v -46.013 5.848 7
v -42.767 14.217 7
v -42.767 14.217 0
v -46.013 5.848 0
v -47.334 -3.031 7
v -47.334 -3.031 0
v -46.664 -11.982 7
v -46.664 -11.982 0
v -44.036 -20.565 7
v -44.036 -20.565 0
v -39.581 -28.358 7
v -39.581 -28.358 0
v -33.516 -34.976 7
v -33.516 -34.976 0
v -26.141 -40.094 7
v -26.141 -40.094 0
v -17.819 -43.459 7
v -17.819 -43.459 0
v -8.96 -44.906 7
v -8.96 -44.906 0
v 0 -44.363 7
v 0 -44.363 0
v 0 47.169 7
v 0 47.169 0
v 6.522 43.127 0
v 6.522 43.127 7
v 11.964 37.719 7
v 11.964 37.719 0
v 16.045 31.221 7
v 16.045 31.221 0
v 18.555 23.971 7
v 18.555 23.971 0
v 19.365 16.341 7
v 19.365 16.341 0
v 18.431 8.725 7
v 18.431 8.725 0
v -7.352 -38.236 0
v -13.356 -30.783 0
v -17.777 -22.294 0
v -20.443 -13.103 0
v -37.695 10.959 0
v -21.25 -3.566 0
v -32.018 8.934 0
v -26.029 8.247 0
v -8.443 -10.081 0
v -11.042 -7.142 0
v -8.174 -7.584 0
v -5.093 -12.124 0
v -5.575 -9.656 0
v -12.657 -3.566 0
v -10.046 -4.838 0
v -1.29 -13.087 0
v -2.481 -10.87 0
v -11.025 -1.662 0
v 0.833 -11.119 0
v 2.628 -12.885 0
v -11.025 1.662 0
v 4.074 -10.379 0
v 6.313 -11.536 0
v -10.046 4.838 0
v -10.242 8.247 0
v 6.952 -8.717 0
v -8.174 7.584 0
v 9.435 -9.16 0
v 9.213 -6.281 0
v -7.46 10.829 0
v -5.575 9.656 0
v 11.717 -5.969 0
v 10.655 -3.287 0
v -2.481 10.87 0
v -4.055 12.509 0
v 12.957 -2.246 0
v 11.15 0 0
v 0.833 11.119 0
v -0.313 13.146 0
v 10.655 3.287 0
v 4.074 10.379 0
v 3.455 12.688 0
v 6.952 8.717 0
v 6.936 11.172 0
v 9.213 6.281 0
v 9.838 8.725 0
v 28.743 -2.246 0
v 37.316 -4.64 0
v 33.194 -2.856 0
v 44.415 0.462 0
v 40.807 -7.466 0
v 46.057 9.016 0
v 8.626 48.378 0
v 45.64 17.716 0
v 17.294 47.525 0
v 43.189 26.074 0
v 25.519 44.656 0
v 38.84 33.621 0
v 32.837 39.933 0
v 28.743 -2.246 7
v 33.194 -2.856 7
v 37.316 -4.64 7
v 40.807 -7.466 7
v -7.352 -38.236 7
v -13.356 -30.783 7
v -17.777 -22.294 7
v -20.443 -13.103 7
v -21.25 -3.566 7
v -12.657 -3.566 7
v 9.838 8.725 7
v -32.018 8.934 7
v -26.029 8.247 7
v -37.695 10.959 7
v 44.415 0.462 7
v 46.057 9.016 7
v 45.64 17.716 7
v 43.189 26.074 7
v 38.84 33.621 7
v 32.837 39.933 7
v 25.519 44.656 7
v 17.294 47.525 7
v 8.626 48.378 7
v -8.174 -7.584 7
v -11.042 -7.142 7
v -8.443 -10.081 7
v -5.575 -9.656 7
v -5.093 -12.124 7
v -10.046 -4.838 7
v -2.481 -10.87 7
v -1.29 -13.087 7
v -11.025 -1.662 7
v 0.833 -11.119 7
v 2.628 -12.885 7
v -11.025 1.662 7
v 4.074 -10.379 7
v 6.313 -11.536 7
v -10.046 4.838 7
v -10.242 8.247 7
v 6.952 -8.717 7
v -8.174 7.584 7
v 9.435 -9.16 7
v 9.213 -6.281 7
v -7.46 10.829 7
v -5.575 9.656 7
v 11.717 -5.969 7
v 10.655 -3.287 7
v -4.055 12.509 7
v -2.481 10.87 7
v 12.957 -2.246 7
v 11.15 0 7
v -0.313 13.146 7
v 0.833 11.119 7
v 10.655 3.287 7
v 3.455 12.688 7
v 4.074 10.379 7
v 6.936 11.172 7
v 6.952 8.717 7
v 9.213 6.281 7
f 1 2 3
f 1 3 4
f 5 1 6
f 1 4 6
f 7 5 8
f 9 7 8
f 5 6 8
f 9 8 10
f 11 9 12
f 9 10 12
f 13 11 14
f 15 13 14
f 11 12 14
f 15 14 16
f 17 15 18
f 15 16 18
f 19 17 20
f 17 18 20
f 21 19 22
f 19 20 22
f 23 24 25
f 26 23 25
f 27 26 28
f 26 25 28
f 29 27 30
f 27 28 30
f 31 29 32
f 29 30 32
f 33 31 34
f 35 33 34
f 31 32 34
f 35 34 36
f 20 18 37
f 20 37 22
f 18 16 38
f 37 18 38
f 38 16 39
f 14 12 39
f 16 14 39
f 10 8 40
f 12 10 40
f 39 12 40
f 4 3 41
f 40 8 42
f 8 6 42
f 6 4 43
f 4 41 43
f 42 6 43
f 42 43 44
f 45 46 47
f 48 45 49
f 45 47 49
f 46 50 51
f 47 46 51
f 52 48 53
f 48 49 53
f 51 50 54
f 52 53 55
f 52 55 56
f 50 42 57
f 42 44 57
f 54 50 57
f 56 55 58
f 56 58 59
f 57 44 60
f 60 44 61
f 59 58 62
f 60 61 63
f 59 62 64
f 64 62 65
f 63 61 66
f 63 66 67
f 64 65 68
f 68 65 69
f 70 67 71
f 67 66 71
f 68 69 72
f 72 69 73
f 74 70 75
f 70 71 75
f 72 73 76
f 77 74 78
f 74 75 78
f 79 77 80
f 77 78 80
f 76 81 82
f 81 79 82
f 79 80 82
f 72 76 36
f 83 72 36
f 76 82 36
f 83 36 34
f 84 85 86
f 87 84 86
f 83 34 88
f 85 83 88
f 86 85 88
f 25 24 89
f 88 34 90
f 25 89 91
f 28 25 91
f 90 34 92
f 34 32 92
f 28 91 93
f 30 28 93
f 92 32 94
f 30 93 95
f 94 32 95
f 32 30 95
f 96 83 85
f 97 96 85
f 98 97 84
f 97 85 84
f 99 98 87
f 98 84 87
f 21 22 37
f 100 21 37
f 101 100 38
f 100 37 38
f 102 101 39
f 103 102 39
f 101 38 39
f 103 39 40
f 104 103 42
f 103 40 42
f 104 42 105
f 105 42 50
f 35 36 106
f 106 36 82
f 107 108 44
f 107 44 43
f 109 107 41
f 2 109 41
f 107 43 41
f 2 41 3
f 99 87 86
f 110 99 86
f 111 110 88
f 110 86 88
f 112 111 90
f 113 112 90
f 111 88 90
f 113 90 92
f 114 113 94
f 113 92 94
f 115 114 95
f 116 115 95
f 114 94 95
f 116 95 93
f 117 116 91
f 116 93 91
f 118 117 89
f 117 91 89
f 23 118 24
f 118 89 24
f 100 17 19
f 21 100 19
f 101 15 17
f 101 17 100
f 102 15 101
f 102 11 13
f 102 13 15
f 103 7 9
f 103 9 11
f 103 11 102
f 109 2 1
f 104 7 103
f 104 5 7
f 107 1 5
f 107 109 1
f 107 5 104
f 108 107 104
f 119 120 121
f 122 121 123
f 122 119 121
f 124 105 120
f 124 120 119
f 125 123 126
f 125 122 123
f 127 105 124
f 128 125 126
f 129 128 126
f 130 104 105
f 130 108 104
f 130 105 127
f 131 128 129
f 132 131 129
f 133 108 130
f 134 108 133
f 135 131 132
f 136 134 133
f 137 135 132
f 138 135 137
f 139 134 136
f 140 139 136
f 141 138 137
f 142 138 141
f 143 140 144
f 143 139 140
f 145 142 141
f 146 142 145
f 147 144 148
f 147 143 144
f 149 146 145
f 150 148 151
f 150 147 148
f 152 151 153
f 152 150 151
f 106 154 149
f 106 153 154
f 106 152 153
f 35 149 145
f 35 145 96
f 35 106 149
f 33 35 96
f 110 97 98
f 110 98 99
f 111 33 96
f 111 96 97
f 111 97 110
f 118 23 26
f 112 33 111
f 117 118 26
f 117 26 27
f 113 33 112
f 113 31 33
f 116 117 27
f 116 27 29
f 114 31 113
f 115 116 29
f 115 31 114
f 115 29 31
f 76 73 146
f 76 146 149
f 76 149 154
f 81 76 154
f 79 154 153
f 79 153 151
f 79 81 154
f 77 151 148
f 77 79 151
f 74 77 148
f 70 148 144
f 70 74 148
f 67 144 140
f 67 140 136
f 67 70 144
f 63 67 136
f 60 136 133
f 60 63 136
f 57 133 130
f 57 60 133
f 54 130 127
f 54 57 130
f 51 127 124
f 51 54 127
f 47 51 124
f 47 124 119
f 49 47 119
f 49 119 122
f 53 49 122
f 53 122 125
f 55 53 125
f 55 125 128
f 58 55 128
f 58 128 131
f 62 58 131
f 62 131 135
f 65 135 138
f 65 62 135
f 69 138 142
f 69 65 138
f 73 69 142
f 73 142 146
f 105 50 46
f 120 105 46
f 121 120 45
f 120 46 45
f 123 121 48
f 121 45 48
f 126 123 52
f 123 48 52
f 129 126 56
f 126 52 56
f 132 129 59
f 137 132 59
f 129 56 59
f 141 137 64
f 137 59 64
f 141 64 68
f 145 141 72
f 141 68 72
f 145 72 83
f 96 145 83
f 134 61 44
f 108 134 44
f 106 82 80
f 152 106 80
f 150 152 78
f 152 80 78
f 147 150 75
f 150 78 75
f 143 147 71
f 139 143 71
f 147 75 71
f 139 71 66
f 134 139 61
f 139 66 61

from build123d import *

# Parameters (mm, degrees)
F0_R     = 11.15
F1_DEPTH = 7


# Not quite as in the source:
# - a feature names something its author has since deleted; it is built from what else it names


with BuildPart() as f1:
    # F0 (on Top) → F1 (new body)
    with BuildSketch(Plane.XY):
        with BuildLine():
            ThreePointArc((-12.6572045799, -3.5661845468), (-12.883564121, 2.6336809867), (-10.2422641065, 8.2473344769))
            Line((-10.2422641065, 8.2473344769), (-26.0292641065, 8.2473344769))
            ThreePointArc((-26.0292641065, 8.2473344769), (-34.9143148349, 9.7844703454), (-42.7665638646, 14.217200689))
            ThreePointArc((-42.7665638646, 14.217200689), (-39.5806592619, -28.3580220296), (0, -44.3633645773))
            ThreePointArc((0, -44.3633645773), (-15.7763325785, -26.6479576979), (-21.2499108166, -3.5661845468))
            Line((-21.2499108166, -3.5661845468), (-12.6572045799, -3.5661845468))
        make_face()
        with BuildLine():
            ThreePointArc((12.9567624843, -2.2460645415), (13.1016015561, -1.1271808486), (13.15, 0))
            ThreePointArc((13.15, 0), (12.2942286487, 4.6663092411), (9.8382978048, 8.7252734229))
            ThreePointArc((9.8382978048, 8.7252734229), (-0.3128955133, 13.1462769025), (-10.2422641065, 8.2473344769))
            ThreePointArc((-10.2422641065, 8.2473344769), (-12.883564121, 2.6336809867), (-12.6572045799, -3.5661845468))
            ThreePointArc((-12.6572045799, -3.5661845468), (0.6768404107, -13.1325697051), (12.9567624843, -2.2460645415))
        make_face()
        Circle(F0_R, mode=Mode.SUBTRACT)
        with BuildLine():
            ThreePointArc((9.8382978048, 8.7252734229), (12.2942286487, 4.6663092411), (13.15, 0))
            ThreePointArc((13.15, 0), (13.1016015561, -1.1271808486), (12.9567624843, -2.2460645415))
            Line((12.9567624843, -2.2460645415), (28.7434491243, -2.2460645415))
            ThreePointArc((28.7434491243, -2.2460645415), (35.3157092291, -3.6070761232), (40.8069513167, -7.4662490586))
            ThreePointArc((40.8069513167, -7.4662490586), (38.839648653, 33.6212574976), (0, 47.1687726676))
            ThreePointArc((0, 47.1687726676), (16.0453137764, 31.2214280727), (18.4312978048, 8.7252734229))
            Line((18.4312978048, 8.7252734229), (9.8382978048, 8.7252734229))
        make_face()
    extrude(amount=F1_DEPTH)


solid = f1.part
